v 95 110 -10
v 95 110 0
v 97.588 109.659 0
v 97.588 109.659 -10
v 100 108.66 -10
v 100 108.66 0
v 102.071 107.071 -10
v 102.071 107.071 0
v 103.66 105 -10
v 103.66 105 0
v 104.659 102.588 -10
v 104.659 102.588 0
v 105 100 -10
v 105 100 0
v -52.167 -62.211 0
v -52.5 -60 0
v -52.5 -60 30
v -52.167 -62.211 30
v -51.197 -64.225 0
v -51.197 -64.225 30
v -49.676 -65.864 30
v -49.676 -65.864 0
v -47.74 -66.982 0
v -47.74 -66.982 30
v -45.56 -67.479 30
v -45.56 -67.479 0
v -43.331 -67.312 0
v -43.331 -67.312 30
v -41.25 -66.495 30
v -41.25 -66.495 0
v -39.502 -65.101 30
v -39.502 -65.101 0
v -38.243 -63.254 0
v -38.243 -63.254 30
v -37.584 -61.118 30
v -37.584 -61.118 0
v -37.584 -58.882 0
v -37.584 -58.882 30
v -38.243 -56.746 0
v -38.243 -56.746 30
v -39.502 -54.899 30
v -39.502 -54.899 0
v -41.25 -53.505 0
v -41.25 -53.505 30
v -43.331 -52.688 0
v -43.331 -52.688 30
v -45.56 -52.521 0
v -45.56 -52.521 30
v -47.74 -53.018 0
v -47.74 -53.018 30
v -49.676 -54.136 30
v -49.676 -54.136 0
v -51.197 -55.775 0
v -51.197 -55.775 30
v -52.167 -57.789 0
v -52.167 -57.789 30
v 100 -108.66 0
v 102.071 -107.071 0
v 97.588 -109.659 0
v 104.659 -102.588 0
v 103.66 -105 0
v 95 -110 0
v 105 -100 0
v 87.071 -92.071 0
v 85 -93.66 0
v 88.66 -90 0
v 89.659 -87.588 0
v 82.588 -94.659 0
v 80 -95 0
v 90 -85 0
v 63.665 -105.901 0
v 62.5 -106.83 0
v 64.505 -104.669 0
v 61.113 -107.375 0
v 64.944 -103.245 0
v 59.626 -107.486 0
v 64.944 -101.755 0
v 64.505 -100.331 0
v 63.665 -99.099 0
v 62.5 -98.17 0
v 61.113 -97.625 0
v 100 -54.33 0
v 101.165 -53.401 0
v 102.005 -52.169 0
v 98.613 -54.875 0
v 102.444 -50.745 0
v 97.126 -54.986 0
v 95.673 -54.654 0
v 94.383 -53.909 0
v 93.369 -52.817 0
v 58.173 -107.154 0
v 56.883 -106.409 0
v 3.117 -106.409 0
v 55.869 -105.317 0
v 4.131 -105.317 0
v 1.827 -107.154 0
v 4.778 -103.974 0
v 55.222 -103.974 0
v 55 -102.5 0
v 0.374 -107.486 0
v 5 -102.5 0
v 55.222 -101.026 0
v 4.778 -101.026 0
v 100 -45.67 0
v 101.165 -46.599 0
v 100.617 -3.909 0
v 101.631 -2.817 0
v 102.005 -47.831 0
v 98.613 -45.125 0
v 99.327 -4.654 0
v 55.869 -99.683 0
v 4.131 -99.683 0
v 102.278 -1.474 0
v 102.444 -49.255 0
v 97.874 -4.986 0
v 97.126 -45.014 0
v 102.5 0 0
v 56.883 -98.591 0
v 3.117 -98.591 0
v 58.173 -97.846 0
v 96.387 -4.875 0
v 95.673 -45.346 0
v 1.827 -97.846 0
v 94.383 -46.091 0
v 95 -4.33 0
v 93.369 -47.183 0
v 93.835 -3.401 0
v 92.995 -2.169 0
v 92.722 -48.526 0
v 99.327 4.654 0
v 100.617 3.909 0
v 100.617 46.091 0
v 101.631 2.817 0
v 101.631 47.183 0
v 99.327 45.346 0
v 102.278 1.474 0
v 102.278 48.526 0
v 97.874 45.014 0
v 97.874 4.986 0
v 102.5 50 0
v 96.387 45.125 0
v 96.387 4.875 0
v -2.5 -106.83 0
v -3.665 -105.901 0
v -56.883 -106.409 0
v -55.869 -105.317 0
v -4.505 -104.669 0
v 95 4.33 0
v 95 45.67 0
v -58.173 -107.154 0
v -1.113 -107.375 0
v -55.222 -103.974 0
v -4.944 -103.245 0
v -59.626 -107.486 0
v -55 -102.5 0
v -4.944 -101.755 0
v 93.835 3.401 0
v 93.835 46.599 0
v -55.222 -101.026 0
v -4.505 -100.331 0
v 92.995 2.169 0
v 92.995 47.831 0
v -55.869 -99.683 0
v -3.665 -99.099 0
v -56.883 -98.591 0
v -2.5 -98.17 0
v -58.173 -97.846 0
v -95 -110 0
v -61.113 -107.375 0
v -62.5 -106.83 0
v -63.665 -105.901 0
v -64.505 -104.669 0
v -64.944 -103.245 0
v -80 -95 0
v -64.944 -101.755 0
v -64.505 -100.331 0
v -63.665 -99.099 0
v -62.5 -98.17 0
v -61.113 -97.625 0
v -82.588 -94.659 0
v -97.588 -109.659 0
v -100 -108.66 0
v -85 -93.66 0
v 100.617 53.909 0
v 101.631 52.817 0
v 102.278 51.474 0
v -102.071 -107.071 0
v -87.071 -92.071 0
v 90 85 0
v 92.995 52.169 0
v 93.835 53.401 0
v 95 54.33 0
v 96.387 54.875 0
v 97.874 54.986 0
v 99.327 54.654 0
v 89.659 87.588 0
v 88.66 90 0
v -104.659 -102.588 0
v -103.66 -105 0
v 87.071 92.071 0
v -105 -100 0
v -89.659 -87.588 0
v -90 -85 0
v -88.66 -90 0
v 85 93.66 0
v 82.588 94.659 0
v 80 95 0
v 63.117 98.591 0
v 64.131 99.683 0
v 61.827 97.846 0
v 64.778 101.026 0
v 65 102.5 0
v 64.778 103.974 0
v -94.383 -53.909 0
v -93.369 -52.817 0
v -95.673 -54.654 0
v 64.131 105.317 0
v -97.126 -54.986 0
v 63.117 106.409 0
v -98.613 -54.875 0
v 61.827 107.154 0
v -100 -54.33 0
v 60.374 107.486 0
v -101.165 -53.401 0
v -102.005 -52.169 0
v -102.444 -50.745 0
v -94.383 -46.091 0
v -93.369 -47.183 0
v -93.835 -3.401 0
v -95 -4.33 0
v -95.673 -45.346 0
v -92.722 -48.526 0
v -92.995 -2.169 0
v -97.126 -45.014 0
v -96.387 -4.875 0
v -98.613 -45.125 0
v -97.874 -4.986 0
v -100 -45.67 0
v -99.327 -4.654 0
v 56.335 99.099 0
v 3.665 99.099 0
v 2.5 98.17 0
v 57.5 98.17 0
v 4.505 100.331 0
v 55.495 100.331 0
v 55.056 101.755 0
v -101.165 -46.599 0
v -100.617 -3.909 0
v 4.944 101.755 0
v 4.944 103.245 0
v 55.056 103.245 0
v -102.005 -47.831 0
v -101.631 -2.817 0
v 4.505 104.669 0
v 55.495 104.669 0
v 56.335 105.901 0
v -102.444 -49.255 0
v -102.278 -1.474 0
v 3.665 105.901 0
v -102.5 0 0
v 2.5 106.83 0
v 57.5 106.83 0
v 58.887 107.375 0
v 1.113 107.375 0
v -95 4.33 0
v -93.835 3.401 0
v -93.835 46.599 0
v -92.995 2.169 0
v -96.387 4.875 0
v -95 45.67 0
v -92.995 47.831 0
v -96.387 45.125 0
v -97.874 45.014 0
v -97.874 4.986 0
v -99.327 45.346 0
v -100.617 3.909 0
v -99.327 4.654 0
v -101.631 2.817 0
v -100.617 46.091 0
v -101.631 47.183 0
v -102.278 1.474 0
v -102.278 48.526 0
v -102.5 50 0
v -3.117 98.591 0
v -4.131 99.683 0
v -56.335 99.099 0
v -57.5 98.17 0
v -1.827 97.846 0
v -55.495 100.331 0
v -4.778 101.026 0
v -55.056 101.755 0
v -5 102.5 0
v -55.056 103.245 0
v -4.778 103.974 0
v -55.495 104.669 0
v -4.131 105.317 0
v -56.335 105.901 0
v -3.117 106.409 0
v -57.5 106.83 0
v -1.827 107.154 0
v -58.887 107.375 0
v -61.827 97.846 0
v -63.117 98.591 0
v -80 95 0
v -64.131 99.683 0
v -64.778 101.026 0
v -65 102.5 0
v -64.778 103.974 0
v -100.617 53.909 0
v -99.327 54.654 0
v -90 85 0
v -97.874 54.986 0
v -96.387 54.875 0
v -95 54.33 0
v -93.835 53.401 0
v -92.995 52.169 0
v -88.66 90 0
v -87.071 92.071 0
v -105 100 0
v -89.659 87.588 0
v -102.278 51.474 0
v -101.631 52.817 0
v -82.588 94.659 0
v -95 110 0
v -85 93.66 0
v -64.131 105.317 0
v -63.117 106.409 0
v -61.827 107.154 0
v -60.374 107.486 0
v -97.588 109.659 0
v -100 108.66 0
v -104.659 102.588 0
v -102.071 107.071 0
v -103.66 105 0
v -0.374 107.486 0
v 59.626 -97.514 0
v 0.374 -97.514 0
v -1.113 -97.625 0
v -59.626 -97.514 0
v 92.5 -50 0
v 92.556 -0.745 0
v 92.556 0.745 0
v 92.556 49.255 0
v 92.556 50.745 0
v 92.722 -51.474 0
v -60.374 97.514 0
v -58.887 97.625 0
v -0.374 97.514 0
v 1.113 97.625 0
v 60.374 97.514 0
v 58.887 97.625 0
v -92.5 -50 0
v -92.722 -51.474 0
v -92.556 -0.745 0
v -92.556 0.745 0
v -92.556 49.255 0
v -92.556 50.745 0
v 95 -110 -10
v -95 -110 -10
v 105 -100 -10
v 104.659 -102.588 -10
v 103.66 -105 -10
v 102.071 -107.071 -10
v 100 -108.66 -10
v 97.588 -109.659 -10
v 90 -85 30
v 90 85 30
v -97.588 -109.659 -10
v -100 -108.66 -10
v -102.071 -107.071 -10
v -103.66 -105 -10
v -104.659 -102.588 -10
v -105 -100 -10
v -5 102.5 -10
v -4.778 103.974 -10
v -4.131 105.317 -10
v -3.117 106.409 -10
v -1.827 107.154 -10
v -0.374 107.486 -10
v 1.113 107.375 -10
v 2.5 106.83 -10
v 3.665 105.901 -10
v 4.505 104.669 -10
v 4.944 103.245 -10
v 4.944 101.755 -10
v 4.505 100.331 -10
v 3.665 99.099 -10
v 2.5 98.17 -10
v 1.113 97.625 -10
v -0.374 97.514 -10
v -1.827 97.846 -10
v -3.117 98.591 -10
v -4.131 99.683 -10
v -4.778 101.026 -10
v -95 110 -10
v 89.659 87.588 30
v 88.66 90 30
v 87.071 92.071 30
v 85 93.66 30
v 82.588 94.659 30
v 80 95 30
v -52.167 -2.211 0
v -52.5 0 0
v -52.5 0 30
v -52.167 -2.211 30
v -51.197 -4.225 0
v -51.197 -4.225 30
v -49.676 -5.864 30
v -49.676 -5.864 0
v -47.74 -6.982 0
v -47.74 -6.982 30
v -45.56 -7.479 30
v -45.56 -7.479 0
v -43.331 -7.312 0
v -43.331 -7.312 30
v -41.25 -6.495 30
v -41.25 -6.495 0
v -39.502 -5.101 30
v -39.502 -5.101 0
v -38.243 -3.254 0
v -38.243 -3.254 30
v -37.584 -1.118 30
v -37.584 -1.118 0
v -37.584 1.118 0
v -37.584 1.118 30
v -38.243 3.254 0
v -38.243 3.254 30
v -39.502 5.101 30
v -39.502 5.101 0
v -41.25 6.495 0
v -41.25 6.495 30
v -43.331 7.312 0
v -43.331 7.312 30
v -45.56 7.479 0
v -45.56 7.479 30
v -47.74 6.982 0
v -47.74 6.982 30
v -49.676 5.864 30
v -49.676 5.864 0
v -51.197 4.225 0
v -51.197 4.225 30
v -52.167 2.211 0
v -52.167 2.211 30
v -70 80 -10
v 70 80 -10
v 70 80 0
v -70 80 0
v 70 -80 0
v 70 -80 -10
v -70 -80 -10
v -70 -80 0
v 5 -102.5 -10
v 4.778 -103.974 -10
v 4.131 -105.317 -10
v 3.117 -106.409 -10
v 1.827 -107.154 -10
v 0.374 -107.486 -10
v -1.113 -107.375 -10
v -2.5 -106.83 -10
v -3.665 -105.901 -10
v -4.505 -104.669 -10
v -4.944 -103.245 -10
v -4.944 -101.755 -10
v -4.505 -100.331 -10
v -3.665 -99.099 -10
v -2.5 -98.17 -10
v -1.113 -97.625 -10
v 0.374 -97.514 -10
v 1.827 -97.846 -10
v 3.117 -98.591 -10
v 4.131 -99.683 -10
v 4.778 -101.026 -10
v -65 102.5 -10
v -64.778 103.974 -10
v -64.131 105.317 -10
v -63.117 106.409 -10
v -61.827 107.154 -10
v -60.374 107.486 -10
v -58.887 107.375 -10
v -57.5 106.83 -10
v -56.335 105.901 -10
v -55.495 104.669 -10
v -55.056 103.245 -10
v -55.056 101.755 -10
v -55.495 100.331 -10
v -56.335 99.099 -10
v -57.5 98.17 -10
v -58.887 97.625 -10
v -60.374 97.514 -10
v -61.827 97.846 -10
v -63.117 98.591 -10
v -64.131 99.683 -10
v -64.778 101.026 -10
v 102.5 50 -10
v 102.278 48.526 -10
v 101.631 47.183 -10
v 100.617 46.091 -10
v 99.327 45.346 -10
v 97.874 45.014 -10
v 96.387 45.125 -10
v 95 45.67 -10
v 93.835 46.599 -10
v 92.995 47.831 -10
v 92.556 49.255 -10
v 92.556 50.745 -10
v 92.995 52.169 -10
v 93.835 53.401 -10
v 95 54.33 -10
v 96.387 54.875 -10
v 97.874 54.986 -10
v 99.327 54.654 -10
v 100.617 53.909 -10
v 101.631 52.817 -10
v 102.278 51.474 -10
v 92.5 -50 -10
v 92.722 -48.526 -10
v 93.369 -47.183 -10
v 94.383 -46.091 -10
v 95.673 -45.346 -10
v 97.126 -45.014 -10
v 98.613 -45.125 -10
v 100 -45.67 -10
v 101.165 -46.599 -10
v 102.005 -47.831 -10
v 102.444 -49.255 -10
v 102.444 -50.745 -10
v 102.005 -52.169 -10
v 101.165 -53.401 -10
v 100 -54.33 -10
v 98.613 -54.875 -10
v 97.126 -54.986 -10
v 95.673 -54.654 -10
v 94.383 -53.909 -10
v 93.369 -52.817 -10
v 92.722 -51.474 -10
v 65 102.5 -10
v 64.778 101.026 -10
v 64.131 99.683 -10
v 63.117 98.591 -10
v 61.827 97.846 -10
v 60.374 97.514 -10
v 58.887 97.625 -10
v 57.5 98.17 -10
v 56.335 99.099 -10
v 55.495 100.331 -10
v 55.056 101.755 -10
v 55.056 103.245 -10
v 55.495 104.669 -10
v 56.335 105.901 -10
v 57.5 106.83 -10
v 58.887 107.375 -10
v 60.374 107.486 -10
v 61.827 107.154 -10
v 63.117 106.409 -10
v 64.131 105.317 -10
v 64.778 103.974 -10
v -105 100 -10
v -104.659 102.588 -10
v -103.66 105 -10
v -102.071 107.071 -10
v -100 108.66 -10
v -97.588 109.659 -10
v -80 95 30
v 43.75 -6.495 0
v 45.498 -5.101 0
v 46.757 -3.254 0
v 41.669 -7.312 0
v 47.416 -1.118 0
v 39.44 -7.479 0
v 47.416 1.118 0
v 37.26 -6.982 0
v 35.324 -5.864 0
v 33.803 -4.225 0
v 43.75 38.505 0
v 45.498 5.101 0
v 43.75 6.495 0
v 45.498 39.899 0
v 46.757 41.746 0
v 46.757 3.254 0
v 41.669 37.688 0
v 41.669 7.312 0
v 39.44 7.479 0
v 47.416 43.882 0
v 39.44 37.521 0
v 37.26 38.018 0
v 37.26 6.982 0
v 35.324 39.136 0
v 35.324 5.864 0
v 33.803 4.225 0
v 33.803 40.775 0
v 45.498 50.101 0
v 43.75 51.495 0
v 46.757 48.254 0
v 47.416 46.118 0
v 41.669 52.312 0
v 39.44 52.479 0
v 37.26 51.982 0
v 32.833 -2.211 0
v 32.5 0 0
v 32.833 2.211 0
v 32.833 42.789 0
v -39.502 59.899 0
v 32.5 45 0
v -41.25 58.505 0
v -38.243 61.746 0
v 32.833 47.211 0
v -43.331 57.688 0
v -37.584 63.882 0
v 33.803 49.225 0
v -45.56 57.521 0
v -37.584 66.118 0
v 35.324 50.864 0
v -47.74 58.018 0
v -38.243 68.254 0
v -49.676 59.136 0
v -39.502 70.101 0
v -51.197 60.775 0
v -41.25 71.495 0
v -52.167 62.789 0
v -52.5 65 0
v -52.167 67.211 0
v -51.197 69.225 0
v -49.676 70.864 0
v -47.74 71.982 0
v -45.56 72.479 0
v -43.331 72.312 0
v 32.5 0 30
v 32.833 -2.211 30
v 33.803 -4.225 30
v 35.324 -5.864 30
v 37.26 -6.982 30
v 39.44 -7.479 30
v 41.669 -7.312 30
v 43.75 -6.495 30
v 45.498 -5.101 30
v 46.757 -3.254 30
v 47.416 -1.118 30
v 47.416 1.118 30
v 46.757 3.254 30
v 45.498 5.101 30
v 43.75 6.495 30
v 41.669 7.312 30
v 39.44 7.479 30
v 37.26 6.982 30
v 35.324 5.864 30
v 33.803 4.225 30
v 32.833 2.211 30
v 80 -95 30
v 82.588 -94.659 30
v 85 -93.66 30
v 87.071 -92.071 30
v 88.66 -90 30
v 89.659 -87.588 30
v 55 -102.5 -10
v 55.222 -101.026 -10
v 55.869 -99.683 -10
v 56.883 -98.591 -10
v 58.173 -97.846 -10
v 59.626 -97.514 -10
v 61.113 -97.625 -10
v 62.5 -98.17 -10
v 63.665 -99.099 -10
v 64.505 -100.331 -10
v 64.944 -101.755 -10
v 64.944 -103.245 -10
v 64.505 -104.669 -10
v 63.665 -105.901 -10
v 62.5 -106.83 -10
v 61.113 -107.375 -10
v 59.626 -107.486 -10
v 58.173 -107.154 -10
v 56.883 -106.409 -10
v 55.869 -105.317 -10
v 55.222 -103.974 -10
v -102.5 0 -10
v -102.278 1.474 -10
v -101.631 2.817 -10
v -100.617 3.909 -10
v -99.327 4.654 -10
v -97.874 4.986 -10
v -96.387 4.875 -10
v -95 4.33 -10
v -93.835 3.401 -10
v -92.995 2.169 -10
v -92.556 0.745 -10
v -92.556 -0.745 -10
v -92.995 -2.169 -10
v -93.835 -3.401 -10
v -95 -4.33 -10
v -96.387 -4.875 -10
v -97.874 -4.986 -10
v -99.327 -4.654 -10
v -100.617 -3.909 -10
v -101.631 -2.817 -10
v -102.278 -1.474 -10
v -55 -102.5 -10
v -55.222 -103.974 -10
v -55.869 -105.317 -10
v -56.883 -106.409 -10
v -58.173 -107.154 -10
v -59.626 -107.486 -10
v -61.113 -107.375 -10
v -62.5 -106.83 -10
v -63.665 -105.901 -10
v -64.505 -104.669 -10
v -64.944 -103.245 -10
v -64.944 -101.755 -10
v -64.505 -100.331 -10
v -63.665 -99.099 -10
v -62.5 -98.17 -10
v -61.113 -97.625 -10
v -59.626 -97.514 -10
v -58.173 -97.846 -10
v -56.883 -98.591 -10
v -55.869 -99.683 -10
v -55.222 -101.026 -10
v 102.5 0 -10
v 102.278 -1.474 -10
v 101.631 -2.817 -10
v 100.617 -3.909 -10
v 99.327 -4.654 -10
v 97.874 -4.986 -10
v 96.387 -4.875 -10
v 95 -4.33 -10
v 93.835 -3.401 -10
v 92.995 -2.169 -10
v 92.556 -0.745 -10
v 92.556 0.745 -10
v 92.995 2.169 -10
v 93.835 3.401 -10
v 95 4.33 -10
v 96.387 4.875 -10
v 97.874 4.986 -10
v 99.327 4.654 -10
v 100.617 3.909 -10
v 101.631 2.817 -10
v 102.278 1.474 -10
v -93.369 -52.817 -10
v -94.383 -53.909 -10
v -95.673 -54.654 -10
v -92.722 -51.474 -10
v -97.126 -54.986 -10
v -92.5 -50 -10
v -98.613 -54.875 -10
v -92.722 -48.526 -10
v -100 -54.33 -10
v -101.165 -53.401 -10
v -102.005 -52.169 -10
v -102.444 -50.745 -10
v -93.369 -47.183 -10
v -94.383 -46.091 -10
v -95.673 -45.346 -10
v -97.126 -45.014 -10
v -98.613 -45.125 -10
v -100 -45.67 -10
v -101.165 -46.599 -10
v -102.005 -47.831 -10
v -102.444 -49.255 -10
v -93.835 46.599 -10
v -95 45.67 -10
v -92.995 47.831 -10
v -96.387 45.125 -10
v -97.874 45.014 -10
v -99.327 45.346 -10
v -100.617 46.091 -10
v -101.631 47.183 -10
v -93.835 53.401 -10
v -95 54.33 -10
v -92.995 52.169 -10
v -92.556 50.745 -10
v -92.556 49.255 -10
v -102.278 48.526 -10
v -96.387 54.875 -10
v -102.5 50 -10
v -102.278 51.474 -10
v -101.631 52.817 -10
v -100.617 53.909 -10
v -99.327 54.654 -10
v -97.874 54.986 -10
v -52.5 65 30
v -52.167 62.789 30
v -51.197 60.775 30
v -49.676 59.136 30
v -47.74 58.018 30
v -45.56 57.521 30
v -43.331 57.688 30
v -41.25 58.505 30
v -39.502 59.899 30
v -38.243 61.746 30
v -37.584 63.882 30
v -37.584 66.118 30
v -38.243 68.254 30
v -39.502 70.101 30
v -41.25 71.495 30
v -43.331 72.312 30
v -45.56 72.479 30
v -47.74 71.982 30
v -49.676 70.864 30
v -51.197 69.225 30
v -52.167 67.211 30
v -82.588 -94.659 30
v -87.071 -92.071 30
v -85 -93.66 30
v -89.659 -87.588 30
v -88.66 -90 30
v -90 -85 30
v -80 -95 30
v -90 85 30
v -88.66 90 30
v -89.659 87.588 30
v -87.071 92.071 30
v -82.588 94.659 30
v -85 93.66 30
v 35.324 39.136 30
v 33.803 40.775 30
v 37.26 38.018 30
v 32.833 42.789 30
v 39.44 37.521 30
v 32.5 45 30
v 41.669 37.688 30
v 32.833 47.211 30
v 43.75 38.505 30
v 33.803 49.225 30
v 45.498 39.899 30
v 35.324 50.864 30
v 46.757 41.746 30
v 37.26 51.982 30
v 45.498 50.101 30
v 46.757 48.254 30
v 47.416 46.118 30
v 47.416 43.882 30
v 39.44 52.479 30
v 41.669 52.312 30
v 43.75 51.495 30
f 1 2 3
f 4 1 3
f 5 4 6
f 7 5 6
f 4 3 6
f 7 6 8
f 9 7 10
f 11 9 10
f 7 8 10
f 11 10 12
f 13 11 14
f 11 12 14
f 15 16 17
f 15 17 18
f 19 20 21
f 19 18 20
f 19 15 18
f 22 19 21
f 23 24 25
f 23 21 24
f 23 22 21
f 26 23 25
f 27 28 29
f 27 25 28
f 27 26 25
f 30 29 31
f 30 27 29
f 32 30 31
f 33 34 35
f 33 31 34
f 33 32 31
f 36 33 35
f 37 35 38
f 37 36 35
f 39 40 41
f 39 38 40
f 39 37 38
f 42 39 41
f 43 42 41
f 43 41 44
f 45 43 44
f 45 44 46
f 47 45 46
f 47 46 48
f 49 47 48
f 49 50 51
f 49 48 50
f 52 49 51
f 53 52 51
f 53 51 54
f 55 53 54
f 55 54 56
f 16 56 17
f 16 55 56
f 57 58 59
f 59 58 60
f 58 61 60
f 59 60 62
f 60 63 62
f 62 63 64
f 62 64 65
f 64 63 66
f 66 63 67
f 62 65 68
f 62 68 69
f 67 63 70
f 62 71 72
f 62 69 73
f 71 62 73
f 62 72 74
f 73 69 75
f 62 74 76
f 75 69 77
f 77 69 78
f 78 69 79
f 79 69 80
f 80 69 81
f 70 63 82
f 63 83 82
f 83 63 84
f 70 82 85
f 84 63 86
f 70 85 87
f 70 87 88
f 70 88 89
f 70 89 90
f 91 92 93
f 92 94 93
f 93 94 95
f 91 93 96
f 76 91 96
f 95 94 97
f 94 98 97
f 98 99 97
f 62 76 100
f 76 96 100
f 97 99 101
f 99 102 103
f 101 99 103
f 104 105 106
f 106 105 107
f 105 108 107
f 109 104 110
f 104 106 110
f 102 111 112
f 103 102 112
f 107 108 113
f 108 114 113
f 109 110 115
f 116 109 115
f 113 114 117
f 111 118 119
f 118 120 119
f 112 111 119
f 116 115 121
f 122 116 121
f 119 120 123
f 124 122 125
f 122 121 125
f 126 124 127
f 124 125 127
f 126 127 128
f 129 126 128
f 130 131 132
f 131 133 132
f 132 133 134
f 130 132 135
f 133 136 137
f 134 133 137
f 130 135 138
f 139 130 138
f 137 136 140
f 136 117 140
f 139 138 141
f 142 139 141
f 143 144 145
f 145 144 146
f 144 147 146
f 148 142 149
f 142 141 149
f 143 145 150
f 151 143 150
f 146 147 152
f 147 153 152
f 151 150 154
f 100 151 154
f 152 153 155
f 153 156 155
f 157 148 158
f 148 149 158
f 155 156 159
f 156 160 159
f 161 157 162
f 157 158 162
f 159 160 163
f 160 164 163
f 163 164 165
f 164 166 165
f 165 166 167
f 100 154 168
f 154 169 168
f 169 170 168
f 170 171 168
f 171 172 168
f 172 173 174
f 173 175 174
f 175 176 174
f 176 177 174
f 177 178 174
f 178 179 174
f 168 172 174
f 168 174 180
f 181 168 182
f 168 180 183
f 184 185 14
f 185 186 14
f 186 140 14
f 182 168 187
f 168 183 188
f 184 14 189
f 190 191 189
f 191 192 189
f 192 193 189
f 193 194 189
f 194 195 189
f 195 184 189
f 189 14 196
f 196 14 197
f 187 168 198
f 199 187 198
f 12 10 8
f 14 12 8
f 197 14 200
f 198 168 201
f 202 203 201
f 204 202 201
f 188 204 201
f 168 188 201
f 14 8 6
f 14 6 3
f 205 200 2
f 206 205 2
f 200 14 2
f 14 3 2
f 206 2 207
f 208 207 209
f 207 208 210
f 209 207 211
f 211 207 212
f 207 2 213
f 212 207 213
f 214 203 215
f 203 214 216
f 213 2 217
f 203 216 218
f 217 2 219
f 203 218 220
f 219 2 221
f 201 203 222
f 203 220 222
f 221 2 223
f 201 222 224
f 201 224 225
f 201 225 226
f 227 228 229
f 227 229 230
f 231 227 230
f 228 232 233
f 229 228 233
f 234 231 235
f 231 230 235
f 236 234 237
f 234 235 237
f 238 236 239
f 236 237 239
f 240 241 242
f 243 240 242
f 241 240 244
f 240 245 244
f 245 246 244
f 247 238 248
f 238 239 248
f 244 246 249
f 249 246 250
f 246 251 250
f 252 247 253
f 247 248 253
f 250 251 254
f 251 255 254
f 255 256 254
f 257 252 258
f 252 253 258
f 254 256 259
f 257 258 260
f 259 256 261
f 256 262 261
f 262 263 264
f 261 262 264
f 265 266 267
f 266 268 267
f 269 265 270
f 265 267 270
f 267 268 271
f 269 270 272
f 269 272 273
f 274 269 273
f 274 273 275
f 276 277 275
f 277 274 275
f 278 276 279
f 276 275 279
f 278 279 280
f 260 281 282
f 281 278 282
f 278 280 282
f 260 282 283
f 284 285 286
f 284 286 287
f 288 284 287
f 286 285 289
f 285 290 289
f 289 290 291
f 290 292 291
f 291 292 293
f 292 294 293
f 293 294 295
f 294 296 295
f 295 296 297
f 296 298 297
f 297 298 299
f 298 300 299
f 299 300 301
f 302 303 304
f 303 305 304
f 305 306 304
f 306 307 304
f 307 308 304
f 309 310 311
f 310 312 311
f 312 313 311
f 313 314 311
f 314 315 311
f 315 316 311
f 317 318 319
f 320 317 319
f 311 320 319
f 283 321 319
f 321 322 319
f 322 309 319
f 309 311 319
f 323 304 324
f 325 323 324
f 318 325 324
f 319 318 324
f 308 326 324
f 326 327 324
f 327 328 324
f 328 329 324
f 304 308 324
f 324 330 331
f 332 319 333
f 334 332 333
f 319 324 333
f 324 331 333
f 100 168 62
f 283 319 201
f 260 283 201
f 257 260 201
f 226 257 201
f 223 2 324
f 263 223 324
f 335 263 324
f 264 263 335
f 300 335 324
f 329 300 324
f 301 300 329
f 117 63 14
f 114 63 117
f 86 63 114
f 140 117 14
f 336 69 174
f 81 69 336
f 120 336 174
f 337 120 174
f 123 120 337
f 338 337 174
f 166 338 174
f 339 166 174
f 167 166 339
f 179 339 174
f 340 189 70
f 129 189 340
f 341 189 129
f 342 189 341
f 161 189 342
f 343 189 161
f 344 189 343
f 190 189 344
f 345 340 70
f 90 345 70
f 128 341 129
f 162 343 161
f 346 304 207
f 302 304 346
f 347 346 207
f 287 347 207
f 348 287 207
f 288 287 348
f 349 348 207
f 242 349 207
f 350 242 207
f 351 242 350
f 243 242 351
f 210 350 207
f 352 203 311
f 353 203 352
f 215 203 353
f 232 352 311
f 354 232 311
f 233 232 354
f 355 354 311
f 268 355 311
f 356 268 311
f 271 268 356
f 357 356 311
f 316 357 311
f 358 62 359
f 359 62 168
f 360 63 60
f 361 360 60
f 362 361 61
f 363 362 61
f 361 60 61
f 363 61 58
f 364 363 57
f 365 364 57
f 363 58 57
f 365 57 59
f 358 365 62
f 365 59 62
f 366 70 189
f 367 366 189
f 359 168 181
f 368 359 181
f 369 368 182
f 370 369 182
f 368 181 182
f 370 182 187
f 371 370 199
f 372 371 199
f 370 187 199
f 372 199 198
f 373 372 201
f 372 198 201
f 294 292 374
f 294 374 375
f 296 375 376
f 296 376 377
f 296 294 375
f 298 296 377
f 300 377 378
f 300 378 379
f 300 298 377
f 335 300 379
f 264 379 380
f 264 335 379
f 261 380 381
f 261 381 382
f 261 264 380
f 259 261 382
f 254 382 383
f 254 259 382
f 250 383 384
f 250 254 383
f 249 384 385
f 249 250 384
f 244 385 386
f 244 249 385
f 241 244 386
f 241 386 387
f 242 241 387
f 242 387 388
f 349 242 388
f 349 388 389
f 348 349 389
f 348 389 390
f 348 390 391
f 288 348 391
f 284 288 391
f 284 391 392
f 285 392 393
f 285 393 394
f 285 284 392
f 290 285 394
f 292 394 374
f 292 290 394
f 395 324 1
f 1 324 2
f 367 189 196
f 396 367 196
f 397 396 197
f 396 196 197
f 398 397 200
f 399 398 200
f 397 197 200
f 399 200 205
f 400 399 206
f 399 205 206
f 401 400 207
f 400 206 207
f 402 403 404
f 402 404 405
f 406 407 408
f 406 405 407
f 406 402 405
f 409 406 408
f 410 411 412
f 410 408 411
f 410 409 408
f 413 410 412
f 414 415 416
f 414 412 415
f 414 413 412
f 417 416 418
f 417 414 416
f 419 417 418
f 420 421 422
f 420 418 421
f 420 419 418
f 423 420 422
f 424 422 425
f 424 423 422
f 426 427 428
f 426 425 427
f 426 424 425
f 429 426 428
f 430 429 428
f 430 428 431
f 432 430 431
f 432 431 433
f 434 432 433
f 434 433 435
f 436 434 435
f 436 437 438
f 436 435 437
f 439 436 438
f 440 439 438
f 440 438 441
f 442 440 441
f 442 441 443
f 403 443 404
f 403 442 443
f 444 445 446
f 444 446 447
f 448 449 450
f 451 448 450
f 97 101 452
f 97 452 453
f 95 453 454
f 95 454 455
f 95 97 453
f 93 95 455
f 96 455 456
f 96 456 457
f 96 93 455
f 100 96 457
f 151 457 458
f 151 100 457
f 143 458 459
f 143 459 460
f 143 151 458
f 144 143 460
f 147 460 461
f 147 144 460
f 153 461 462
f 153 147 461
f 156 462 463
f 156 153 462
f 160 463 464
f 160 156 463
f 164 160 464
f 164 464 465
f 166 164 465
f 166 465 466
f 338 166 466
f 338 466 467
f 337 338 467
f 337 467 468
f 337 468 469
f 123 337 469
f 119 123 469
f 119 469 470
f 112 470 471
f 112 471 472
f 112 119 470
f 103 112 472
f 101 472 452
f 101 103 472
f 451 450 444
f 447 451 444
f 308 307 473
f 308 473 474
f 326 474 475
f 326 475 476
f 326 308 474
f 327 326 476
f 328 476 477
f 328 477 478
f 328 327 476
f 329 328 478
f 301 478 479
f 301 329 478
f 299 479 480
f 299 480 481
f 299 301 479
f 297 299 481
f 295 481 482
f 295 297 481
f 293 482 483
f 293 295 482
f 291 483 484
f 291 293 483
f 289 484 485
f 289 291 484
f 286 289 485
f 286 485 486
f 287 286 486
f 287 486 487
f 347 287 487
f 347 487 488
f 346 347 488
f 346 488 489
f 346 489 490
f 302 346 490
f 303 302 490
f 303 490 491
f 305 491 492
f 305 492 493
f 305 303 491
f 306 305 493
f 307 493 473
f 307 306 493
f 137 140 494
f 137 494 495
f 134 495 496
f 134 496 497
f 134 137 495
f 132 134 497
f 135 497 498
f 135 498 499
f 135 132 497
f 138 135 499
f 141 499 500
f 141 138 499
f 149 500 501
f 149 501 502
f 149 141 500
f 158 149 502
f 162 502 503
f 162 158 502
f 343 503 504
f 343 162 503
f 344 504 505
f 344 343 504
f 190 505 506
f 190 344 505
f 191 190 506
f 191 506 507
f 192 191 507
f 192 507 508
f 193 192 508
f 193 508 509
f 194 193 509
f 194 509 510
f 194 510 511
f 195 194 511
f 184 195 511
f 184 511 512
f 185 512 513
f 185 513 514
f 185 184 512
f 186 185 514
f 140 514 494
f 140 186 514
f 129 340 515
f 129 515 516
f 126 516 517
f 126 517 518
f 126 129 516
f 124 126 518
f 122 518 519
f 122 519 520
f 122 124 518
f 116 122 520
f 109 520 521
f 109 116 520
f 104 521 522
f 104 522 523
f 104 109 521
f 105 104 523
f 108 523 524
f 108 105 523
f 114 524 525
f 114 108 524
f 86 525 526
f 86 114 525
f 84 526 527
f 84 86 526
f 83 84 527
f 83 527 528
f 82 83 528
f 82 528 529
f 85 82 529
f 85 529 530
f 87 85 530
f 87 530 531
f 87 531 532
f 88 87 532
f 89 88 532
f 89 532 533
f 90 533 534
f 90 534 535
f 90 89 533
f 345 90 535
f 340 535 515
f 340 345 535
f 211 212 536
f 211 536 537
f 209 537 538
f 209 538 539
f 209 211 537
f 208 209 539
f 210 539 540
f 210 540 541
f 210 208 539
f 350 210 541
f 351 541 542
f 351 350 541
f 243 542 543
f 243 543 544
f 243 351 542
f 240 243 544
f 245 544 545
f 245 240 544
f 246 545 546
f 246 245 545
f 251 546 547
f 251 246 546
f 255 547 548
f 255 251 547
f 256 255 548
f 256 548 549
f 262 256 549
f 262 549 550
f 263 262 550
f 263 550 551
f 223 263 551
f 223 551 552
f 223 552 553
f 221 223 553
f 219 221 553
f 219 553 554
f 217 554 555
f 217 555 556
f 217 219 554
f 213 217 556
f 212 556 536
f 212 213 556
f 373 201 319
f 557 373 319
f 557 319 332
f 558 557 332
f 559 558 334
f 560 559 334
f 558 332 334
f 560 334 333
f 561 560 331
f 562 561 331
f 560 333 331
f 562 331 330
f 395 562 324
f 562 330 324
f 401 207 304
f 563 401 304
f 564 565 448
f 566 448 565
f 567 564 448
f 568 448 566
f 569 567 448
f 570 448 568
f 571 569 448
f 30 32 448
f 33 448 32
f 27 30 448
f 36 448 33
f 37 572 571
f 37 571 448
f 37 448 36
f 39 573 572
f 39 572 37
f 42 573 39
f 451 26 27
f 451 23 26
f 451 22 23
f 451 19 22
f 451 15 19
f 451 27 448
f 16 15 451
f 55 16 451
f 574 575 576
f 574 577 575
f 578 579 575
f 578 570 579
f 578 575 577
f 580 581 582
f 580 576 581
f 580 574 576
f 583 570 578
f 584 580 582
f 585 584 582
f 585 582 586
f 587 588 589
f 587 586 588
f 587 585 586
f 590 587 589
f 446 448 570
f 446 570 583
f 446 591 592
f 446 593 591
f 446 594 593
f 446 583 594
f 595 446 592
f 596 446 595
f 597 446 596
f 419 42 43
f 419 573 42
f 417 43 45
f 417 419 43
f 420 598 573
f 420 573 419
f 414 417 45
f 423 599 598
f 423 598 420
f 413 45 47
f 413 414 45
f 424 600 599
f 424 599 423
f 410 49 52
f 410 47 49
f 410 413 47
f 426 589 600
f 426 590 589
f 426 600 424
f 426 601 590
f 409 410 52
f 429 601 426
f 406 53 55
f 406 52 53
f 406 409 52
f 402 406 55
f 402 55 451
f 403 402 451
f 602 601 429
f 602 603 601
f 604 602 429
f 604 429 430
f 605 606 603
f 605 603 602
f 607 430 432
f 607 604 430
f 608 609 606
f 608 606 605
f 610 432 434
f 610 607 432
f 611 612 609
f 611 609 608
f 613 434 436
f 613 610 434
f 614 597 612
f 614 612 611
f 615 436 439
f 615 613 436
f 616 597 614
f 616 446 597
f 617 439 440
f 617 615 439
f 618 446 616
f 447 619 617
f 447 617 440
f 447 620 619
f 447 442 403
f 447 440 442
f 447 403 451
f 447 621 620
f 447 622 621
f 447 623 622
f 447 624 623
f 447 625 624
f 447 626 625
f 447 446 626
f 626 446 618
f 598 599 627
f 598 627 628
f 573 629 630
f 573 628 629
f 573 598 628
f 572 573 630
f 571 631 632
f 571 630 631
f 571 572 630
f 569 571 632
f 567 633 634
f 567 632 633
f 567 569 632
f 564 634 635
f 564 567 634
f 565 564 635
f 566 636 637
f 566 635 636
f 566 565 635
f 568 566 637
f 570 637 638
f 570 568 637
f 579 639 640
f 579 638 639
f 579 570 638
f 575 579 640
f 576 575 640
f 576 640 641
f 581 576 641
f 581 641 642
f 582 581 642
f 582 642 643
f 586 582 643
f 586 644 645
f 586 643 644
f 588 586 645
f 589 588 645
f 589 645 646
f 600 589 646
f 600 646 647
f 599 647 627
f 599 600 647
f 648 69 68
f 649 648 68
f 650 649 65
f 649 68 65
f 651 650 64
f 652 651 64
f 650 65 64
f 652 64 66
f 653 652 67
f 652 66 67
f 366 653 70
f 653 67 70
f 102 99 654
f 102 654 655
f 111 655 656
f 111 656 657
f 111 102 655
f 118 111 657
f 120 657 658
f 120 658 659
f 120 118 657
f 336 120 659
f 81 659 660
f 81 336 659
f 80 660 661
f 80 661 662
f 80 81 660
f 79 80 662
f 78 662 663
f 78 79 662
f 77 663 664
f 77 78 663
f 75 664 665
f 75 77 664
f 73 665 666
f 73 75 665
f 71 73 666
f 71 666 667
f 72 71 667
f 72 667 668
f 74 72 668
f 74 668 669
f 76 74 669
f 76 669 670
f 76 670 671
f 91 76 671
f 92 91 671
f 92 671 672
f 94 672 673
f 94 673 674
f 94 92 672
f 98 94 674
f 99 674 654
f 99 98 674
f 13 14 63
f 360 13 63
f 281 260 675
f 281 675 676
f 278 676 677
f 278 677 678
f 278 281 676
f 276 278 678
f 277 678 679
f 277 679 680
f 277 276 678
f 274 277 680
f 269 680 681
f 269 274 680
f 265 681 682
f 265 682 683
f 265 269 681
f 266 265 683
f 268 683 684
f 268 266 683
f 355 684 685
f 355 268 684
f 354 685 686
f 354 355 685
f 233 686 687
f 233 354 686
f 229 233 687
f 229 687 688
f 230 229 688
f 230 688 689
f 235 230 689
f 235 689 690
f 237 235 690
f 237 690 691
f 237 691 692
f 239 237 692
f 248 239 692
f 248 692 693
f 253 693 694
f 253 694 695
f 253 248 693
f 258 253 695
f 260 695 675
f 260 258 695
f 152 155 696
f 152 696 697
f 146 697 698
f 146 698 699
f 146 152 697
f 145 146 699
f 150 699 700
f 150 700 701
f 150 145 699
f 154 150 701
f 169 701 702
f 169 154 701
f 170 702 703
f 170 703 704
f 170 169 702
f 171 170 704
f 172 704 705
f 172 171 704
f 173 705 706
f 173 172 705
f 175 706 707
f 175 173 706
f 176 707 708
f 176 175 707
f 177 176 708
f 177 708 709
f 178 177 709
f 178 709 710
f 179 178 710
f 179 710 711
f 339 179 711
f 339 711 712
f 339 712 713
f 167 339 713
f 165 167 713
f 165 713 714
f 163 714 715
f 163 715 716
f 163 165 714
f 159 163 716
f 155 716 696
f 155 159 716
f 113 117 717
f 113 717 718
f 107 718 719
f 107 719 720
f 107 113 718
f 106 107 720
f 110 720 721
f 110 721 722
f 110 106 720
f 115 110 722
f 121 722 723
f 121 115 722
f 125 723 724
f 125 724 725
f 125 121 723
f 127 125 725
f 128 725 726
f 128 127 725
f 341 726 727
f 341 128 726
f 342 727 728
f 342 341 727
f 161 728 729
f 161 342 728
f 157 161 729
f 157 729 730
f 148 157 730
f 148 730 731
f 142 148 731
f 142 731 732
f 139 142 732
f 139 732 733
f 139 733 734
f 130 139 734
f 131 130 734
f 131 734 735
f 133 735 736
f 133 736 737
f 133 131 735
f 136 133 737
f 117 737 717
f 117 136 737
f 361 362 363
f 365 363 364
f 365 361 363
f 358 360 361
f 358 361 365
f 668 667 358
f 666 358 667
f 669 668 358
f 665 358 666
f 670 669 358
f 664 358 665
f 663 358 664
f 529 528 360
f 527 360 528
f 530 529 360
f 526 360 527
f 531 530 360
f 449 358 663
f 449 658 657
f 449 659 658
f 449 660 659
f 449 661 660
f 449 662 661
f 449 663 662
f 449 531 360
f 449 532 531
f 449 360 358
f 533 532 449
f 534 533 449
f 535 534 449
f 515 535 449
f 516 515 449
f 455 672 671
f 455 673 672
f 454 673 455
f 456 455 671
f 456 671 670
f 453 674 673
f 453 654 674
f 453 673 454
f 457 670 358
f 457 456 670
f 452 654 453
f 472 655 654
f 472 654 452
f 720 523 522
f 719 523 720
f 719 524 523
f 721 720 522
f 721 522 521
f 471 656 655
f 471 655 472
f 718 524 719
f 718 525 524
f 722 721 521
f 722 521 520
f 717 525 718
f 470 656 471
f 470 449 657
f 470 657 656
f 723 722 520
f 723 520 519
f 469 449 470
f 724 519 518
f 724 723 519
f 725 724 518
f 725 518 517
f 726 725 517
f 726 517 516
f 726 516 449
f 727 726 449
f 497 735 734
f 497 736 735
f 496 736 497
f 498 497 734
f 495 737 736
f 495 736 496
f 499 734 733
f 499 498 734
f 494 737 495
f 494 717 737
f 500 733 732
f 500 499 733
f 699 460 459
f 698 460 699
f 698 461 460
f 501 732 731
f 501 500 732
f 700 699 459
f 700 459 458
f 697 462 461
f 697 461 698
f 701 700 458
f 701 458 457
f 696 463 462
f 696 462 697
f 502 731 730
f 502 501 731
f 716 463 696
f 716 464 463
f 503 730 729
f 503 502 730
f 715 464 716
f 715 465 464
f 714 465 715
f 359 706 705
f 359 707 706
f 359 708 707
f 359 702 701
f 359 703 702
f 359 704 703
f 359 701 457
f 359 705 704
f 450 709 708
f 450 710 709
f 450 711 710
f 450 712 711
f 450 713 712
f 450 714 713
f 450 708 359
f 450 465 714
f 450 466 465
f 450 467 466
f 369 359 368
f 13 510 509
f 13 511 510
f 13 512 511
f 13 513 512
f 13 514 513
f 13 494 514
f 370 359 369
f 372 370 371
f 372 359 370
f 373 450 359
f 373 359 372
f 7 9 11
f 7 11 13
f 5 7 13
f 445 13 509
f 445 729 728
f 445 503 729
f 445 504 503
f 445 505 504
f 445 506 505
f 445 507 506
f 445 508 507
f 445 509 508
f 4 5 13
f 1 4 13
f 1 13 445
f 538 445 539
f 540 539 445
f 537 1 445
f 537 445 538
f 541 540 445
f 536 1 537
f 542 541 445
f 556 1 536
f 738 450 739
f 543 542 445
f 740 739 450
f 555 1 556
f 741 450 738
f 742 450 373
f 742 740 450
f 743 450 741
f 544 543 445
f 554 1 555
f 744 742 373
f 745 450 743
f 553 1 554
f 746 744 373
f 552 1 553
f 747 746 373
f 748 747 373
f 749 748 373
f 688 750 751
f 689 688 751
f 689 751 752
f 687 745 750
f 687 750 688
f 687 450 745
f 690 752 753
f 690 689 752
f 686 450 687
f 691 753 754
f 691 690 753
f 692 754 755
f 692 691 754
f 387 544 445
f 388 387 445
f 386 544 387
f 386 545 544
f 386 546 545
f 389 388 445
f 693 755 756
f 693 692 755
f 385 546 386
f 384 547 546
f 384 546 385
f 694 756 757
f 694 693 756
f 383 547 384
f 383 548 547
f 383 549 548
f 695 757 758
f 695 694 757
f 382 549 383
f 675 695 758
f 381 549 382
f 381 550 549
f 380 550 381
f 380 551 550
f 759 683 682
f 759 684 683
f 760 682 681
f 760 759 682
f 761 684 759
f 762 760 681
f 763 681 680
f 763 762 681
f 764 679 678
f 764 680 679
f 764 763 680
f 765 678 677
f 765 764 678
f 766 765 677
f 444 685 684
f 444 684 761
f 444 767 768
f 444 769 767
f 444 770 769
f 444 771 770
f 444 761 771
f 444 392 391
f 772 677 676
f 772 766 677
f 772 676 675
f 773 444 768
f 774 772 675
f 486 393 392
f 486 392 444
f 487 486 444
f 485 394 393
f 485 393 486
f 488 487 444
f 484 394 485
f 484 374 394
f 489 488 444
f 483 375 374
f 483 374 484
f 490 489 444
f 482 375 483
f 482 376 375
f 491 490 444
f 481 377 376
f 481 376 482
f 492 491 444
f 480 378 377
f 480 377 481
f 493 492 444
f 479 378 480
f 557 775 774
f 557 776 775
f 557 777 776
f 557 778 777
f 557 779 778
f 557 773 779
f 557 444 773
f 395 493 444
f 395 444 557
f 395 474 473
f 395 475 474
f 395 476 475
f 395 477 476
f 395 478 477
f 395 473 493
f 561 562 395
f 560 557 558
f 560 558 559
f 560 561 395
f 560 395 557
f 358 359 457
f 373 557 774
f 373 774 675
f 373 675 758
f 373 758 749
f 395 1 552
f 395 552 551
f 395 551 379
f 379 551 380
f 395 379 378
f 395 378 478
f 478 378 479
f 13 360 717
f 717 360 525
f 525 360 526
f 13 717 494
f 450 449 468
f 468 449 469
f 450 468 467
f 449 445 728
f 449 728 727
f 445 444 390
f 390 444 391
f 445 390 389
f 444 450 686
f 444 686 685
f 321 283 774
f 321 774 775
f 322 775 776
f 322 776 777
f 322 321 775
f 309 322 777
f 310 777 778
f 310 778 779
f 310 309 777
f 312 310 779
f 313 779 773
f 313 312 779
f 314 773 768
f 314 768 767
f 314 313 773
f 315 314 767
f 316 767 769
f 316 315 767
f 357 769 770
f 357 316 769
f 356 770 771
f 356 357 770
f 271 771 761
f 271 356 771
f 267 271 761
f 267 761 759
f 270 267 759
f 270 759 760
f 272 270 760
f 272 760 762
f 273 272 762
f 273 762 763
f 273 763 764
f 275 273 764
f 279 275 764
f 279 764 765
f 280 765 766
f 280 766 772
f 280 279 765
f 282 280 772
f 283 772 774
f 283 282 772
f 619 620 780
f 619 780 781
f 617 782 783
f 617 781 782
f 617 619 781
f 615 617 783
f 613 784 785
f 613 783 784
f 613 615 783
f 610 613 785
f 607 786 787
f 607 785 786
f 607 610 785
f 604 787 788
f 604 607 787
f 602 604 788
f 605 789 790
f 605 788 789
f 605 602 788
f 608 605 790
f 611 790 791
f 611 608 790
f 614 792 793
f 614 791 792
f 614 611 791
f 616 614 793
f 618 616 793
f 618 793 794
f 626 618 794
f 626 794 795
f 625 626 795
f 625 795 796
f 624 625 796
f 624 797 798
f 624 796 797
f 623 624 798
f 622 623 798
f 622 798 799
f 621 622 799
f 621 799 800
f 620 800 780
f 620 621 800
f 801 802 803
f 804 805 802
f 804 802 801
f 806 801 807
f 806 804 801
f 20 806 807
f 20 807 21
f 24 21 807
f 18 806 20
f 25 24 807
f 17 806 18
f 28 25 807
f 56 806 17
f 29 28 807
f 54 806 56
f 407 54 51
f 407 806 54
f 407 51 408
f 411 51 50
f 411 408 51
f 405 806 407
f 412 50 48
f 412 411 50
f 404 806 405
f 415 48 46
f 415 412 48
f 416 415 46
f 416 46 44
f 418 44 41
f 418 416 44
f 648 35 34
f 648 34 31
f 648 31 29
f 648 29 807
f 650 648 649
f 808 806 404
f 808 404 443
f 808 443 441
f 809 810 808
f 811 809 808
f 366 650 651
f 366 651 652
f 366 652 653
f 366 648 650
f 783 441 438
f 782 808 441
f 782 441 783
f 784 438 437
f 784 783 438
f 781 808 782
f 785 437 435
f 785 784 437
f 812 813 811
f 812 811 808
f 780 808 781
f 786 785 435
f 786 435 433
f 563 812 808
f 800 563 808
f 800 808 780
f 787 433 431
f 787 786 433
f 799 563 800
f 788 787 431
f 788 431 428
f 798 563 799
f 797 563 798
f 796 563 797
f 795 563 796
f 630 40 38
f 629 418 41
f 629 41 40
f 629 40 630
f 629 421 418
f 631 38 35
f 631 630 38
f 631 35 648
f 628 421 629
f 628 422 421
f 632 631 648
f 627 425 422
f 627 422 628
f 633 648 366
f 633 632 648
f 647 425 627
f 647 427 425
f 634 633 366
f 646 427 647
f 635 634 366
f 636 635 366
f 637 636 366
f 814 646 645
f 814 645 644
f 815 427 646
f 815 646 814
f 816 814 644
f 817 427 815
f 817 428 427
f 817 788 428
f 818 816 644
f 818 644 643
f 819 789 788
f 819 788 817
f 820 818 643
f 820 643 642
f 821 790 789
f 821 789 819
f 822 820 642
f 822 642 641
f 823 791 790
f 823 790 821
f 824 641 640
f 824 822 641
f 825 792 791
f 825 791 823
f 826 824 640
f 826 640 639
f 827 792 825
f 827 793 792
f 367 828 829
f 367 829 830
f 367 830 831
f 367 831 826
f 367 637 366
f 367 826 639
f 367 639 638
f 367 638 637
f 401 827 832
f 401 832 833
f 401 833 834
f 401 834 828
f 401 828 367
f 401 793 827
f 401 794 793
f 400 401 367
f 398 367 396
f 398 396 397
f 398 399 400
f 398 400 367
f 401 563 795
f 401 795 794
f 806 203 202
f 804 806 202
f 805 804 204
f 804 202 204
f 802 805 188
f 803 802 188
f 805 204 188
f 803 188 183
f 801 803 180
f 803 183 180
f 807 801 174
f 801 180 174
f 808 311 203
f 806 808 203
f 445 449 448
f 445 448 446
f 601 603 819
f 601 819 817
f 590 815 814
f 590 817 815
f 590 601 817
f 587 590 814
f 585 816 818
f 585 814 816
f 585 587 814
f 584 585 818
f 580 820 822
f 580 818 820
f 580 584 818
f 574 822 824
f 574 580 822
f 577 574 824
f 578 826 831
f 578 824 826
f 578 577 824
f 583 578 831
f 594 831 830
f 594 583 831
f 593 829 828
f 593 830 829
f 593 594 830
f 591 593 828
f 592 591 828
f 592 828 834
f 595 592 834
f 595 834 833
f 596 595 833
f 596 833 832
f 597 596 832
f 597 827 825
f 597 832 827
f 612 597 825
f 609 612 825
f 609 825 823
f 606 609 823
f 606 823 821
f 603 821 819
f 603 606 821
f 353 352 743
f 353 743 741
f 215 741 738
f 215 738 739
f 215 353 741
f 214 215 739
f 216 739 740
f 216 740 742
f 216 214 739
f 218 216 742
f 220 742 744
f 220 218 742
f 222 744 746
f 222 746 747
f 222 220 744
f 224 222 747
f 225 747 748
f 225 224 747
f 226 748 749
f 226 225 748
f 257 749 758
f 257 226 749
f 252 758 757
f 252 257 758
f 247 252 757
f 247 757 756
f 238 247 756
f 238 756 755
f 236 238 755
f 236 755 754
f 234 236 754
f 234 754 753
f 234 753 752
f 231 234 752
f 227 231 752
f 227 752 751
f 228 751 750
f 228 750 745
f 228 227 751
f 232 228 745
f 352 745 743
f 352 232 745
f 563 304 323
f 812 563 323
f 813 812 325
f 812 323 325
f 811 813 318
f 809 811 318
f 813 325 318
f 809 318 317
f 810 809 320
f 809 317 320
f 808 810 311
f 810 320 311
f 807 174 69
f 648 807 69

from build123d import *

# Parameters (mm, degrees)
EXTRUDE_1_DEPTH          = 30
SKETCH_2_R               = 5
EXTRUDE_2_DEPTH          = 10
SKETCH_3_W               = 140
SKETCH_3_H               = 160
CUT_EXTRUDE_1_DEPTH      = 10
CUT_EXTRUDE_2_DEPTH      = 158.241851935
CUT_EXTRUDE_2_DEPTH_BACK = 158.241851935
SKETCH_4_R               = 7.5


with BuildPart() as part:
    # 草图1 → 凸台-拉伸1 (new body)
    with BuildSketch(Plane.XY):
        with BuildLine():
            Line((-80, -95), (80, -95))
            ThreePointArc((80, -95), (87.071067812, -92.071067812), (90, -85))
            Line((90, -85), (90, 85))
            ThreePointArc((90, 85), (87.071067812, 92.071067812), (80, 95))
            Line((80, 95), (-80, 95))
            ThreePointArc((-80, 95), (-87.071067812, 92.071067812), (-90, 85))
            Line((-90, 85), (-90, -85))
            ThreePointArc((-90, -85), (-87.071067812, -92.071067812), (-80, -95))
        make_face()
    extrude(amount=EXTRUDE_1_DEPTH)

    # 草图2 → 凸台-拉伸2 (add)
    with BuildSketch(Plane(origin=(0, 0, 0), x_dir=(-1, 0, 0), z_dir=(0, 0, -1))):
        with BuildLine():
            Line((-95, -110), (95, -110))
            ThreePointArc((95, -110), (102.071067812, -107.071067812), (105, -100))
            Line((105, -100), (105, 100))
            ThreePointArc((105, 100), (102.071067812, 107.071067812), (95, 110))
            Line((95, 110), (-95, 110))
            ThreePointArc((-95, 110), (-102.071067812, 107.071067812), (-105, 100))
            Line((-105, 100), (-105, -100))
            ThreePointArc((-105, -100), (-102.071067812, -107.071067812), (-95, -110))
        make_face()
        with Locations((97.5, 0)):
            Circle(SKETCH_2_R, mode=Mode.SUBTRACT)
        with Locations((0, 102.5)):
            Circle(SKETCH_2_R, mode=Mode.SUBTRACT)
        with Locations((60, 102.5)):
            Circle(SKETCH_2_R, mode=Mode.SUBTRACT)
        with Locations((97.5, 50)):
            Circle(SKETCH_2_R, mode=Mode.SUBTRACT)
        with Locations(Location((97.5, -50, 0), (0, 0, 180))):
            Circle(SKETCH_2_R, mode=Mode.SUBTRACT)
        with Locations(Location((60, -102.5, 0), (0, 0, 180))):
            Circle(SKETCH_2_R, mode=Mode.SUBTRACT)
        with Locations(Location((0, -102.5, 0), (0, 0, 180))):
            Circle(SKETCH_2_R, mode=Mode.SUBTRACT)
        with Locations(Location((-60, 102.5, 0), (0, 0, 180))):
            Circle(SKETCH_2_R, mode=Mode.SUBTRACT)
        with Locations((-60, -102.5)):
            Circle(SKETCH_2_R, mode=Mode.SUBTRACT)
        with Locations((-97.5, -50)):
            Circle(SKETCH_2_R, mode=Mode.SUBTRACT)
        with Locations(Location((-97.5, 0, 0), (0, 0, 180))):
            Circle(SKETCH_2_R, mode=Mode.SUBTRACT)
        with Locations(Location((-97.5, 50, 0), (0, 0, 180))):
            Circle(SKETCH_2_R, mode=Mode.SUBTRACT)
    extrude(amount=EXTRUDE_2_DEPTH)

    # 草图3 → 切除-拉伸1 (cut)
    with BuildSketch(Plane(origin=(0, 0, -10), x_dir=(-1, 0, 0), z_dir=(0, 0, -1))):
        Rectangle(SKETCH_3_W, SKETCH_3_H)
    extrude(amount=-CUT_EXTRUDE_1_DEPTH, mode=Mode.SUBTRACT)

    # 草图4 → 切除-拉伸2 (cut, two sides: drawn at the far end of the back side and taken through both)
    with BuildSketch(Plane.XY.offset(30).offset(-CUT_EXTRUDE_2_DEPTH_BACK)):
        with Locations(Location((40, 45, 0), (0, 0, 180))):
            Circle(SKETCH_4_R)
        with Locations(Location((40, 0, 0), (0, 0, 180))):
            Circle(SKETCH_4_R)
        with Locations(Location((-45, 0, 0), (0, 0, 180))):
            Circle(SKETCH_4_R)
        with Locations(Location((-45, 65, 0), (0, 0, 180))):
            Circle(SKETCH_4_R)
        with Locations(Location((-45, -60, 0), (0, 0, 180))):
            Circle(SKETCH_4_R)
    extrude(amount=CUT_EXTRUDE_2_DEPTH + CUT_EXTRUDE_2_DEPTH_BACK, mode=Mode.SUBTRACT)


solid = part.part
